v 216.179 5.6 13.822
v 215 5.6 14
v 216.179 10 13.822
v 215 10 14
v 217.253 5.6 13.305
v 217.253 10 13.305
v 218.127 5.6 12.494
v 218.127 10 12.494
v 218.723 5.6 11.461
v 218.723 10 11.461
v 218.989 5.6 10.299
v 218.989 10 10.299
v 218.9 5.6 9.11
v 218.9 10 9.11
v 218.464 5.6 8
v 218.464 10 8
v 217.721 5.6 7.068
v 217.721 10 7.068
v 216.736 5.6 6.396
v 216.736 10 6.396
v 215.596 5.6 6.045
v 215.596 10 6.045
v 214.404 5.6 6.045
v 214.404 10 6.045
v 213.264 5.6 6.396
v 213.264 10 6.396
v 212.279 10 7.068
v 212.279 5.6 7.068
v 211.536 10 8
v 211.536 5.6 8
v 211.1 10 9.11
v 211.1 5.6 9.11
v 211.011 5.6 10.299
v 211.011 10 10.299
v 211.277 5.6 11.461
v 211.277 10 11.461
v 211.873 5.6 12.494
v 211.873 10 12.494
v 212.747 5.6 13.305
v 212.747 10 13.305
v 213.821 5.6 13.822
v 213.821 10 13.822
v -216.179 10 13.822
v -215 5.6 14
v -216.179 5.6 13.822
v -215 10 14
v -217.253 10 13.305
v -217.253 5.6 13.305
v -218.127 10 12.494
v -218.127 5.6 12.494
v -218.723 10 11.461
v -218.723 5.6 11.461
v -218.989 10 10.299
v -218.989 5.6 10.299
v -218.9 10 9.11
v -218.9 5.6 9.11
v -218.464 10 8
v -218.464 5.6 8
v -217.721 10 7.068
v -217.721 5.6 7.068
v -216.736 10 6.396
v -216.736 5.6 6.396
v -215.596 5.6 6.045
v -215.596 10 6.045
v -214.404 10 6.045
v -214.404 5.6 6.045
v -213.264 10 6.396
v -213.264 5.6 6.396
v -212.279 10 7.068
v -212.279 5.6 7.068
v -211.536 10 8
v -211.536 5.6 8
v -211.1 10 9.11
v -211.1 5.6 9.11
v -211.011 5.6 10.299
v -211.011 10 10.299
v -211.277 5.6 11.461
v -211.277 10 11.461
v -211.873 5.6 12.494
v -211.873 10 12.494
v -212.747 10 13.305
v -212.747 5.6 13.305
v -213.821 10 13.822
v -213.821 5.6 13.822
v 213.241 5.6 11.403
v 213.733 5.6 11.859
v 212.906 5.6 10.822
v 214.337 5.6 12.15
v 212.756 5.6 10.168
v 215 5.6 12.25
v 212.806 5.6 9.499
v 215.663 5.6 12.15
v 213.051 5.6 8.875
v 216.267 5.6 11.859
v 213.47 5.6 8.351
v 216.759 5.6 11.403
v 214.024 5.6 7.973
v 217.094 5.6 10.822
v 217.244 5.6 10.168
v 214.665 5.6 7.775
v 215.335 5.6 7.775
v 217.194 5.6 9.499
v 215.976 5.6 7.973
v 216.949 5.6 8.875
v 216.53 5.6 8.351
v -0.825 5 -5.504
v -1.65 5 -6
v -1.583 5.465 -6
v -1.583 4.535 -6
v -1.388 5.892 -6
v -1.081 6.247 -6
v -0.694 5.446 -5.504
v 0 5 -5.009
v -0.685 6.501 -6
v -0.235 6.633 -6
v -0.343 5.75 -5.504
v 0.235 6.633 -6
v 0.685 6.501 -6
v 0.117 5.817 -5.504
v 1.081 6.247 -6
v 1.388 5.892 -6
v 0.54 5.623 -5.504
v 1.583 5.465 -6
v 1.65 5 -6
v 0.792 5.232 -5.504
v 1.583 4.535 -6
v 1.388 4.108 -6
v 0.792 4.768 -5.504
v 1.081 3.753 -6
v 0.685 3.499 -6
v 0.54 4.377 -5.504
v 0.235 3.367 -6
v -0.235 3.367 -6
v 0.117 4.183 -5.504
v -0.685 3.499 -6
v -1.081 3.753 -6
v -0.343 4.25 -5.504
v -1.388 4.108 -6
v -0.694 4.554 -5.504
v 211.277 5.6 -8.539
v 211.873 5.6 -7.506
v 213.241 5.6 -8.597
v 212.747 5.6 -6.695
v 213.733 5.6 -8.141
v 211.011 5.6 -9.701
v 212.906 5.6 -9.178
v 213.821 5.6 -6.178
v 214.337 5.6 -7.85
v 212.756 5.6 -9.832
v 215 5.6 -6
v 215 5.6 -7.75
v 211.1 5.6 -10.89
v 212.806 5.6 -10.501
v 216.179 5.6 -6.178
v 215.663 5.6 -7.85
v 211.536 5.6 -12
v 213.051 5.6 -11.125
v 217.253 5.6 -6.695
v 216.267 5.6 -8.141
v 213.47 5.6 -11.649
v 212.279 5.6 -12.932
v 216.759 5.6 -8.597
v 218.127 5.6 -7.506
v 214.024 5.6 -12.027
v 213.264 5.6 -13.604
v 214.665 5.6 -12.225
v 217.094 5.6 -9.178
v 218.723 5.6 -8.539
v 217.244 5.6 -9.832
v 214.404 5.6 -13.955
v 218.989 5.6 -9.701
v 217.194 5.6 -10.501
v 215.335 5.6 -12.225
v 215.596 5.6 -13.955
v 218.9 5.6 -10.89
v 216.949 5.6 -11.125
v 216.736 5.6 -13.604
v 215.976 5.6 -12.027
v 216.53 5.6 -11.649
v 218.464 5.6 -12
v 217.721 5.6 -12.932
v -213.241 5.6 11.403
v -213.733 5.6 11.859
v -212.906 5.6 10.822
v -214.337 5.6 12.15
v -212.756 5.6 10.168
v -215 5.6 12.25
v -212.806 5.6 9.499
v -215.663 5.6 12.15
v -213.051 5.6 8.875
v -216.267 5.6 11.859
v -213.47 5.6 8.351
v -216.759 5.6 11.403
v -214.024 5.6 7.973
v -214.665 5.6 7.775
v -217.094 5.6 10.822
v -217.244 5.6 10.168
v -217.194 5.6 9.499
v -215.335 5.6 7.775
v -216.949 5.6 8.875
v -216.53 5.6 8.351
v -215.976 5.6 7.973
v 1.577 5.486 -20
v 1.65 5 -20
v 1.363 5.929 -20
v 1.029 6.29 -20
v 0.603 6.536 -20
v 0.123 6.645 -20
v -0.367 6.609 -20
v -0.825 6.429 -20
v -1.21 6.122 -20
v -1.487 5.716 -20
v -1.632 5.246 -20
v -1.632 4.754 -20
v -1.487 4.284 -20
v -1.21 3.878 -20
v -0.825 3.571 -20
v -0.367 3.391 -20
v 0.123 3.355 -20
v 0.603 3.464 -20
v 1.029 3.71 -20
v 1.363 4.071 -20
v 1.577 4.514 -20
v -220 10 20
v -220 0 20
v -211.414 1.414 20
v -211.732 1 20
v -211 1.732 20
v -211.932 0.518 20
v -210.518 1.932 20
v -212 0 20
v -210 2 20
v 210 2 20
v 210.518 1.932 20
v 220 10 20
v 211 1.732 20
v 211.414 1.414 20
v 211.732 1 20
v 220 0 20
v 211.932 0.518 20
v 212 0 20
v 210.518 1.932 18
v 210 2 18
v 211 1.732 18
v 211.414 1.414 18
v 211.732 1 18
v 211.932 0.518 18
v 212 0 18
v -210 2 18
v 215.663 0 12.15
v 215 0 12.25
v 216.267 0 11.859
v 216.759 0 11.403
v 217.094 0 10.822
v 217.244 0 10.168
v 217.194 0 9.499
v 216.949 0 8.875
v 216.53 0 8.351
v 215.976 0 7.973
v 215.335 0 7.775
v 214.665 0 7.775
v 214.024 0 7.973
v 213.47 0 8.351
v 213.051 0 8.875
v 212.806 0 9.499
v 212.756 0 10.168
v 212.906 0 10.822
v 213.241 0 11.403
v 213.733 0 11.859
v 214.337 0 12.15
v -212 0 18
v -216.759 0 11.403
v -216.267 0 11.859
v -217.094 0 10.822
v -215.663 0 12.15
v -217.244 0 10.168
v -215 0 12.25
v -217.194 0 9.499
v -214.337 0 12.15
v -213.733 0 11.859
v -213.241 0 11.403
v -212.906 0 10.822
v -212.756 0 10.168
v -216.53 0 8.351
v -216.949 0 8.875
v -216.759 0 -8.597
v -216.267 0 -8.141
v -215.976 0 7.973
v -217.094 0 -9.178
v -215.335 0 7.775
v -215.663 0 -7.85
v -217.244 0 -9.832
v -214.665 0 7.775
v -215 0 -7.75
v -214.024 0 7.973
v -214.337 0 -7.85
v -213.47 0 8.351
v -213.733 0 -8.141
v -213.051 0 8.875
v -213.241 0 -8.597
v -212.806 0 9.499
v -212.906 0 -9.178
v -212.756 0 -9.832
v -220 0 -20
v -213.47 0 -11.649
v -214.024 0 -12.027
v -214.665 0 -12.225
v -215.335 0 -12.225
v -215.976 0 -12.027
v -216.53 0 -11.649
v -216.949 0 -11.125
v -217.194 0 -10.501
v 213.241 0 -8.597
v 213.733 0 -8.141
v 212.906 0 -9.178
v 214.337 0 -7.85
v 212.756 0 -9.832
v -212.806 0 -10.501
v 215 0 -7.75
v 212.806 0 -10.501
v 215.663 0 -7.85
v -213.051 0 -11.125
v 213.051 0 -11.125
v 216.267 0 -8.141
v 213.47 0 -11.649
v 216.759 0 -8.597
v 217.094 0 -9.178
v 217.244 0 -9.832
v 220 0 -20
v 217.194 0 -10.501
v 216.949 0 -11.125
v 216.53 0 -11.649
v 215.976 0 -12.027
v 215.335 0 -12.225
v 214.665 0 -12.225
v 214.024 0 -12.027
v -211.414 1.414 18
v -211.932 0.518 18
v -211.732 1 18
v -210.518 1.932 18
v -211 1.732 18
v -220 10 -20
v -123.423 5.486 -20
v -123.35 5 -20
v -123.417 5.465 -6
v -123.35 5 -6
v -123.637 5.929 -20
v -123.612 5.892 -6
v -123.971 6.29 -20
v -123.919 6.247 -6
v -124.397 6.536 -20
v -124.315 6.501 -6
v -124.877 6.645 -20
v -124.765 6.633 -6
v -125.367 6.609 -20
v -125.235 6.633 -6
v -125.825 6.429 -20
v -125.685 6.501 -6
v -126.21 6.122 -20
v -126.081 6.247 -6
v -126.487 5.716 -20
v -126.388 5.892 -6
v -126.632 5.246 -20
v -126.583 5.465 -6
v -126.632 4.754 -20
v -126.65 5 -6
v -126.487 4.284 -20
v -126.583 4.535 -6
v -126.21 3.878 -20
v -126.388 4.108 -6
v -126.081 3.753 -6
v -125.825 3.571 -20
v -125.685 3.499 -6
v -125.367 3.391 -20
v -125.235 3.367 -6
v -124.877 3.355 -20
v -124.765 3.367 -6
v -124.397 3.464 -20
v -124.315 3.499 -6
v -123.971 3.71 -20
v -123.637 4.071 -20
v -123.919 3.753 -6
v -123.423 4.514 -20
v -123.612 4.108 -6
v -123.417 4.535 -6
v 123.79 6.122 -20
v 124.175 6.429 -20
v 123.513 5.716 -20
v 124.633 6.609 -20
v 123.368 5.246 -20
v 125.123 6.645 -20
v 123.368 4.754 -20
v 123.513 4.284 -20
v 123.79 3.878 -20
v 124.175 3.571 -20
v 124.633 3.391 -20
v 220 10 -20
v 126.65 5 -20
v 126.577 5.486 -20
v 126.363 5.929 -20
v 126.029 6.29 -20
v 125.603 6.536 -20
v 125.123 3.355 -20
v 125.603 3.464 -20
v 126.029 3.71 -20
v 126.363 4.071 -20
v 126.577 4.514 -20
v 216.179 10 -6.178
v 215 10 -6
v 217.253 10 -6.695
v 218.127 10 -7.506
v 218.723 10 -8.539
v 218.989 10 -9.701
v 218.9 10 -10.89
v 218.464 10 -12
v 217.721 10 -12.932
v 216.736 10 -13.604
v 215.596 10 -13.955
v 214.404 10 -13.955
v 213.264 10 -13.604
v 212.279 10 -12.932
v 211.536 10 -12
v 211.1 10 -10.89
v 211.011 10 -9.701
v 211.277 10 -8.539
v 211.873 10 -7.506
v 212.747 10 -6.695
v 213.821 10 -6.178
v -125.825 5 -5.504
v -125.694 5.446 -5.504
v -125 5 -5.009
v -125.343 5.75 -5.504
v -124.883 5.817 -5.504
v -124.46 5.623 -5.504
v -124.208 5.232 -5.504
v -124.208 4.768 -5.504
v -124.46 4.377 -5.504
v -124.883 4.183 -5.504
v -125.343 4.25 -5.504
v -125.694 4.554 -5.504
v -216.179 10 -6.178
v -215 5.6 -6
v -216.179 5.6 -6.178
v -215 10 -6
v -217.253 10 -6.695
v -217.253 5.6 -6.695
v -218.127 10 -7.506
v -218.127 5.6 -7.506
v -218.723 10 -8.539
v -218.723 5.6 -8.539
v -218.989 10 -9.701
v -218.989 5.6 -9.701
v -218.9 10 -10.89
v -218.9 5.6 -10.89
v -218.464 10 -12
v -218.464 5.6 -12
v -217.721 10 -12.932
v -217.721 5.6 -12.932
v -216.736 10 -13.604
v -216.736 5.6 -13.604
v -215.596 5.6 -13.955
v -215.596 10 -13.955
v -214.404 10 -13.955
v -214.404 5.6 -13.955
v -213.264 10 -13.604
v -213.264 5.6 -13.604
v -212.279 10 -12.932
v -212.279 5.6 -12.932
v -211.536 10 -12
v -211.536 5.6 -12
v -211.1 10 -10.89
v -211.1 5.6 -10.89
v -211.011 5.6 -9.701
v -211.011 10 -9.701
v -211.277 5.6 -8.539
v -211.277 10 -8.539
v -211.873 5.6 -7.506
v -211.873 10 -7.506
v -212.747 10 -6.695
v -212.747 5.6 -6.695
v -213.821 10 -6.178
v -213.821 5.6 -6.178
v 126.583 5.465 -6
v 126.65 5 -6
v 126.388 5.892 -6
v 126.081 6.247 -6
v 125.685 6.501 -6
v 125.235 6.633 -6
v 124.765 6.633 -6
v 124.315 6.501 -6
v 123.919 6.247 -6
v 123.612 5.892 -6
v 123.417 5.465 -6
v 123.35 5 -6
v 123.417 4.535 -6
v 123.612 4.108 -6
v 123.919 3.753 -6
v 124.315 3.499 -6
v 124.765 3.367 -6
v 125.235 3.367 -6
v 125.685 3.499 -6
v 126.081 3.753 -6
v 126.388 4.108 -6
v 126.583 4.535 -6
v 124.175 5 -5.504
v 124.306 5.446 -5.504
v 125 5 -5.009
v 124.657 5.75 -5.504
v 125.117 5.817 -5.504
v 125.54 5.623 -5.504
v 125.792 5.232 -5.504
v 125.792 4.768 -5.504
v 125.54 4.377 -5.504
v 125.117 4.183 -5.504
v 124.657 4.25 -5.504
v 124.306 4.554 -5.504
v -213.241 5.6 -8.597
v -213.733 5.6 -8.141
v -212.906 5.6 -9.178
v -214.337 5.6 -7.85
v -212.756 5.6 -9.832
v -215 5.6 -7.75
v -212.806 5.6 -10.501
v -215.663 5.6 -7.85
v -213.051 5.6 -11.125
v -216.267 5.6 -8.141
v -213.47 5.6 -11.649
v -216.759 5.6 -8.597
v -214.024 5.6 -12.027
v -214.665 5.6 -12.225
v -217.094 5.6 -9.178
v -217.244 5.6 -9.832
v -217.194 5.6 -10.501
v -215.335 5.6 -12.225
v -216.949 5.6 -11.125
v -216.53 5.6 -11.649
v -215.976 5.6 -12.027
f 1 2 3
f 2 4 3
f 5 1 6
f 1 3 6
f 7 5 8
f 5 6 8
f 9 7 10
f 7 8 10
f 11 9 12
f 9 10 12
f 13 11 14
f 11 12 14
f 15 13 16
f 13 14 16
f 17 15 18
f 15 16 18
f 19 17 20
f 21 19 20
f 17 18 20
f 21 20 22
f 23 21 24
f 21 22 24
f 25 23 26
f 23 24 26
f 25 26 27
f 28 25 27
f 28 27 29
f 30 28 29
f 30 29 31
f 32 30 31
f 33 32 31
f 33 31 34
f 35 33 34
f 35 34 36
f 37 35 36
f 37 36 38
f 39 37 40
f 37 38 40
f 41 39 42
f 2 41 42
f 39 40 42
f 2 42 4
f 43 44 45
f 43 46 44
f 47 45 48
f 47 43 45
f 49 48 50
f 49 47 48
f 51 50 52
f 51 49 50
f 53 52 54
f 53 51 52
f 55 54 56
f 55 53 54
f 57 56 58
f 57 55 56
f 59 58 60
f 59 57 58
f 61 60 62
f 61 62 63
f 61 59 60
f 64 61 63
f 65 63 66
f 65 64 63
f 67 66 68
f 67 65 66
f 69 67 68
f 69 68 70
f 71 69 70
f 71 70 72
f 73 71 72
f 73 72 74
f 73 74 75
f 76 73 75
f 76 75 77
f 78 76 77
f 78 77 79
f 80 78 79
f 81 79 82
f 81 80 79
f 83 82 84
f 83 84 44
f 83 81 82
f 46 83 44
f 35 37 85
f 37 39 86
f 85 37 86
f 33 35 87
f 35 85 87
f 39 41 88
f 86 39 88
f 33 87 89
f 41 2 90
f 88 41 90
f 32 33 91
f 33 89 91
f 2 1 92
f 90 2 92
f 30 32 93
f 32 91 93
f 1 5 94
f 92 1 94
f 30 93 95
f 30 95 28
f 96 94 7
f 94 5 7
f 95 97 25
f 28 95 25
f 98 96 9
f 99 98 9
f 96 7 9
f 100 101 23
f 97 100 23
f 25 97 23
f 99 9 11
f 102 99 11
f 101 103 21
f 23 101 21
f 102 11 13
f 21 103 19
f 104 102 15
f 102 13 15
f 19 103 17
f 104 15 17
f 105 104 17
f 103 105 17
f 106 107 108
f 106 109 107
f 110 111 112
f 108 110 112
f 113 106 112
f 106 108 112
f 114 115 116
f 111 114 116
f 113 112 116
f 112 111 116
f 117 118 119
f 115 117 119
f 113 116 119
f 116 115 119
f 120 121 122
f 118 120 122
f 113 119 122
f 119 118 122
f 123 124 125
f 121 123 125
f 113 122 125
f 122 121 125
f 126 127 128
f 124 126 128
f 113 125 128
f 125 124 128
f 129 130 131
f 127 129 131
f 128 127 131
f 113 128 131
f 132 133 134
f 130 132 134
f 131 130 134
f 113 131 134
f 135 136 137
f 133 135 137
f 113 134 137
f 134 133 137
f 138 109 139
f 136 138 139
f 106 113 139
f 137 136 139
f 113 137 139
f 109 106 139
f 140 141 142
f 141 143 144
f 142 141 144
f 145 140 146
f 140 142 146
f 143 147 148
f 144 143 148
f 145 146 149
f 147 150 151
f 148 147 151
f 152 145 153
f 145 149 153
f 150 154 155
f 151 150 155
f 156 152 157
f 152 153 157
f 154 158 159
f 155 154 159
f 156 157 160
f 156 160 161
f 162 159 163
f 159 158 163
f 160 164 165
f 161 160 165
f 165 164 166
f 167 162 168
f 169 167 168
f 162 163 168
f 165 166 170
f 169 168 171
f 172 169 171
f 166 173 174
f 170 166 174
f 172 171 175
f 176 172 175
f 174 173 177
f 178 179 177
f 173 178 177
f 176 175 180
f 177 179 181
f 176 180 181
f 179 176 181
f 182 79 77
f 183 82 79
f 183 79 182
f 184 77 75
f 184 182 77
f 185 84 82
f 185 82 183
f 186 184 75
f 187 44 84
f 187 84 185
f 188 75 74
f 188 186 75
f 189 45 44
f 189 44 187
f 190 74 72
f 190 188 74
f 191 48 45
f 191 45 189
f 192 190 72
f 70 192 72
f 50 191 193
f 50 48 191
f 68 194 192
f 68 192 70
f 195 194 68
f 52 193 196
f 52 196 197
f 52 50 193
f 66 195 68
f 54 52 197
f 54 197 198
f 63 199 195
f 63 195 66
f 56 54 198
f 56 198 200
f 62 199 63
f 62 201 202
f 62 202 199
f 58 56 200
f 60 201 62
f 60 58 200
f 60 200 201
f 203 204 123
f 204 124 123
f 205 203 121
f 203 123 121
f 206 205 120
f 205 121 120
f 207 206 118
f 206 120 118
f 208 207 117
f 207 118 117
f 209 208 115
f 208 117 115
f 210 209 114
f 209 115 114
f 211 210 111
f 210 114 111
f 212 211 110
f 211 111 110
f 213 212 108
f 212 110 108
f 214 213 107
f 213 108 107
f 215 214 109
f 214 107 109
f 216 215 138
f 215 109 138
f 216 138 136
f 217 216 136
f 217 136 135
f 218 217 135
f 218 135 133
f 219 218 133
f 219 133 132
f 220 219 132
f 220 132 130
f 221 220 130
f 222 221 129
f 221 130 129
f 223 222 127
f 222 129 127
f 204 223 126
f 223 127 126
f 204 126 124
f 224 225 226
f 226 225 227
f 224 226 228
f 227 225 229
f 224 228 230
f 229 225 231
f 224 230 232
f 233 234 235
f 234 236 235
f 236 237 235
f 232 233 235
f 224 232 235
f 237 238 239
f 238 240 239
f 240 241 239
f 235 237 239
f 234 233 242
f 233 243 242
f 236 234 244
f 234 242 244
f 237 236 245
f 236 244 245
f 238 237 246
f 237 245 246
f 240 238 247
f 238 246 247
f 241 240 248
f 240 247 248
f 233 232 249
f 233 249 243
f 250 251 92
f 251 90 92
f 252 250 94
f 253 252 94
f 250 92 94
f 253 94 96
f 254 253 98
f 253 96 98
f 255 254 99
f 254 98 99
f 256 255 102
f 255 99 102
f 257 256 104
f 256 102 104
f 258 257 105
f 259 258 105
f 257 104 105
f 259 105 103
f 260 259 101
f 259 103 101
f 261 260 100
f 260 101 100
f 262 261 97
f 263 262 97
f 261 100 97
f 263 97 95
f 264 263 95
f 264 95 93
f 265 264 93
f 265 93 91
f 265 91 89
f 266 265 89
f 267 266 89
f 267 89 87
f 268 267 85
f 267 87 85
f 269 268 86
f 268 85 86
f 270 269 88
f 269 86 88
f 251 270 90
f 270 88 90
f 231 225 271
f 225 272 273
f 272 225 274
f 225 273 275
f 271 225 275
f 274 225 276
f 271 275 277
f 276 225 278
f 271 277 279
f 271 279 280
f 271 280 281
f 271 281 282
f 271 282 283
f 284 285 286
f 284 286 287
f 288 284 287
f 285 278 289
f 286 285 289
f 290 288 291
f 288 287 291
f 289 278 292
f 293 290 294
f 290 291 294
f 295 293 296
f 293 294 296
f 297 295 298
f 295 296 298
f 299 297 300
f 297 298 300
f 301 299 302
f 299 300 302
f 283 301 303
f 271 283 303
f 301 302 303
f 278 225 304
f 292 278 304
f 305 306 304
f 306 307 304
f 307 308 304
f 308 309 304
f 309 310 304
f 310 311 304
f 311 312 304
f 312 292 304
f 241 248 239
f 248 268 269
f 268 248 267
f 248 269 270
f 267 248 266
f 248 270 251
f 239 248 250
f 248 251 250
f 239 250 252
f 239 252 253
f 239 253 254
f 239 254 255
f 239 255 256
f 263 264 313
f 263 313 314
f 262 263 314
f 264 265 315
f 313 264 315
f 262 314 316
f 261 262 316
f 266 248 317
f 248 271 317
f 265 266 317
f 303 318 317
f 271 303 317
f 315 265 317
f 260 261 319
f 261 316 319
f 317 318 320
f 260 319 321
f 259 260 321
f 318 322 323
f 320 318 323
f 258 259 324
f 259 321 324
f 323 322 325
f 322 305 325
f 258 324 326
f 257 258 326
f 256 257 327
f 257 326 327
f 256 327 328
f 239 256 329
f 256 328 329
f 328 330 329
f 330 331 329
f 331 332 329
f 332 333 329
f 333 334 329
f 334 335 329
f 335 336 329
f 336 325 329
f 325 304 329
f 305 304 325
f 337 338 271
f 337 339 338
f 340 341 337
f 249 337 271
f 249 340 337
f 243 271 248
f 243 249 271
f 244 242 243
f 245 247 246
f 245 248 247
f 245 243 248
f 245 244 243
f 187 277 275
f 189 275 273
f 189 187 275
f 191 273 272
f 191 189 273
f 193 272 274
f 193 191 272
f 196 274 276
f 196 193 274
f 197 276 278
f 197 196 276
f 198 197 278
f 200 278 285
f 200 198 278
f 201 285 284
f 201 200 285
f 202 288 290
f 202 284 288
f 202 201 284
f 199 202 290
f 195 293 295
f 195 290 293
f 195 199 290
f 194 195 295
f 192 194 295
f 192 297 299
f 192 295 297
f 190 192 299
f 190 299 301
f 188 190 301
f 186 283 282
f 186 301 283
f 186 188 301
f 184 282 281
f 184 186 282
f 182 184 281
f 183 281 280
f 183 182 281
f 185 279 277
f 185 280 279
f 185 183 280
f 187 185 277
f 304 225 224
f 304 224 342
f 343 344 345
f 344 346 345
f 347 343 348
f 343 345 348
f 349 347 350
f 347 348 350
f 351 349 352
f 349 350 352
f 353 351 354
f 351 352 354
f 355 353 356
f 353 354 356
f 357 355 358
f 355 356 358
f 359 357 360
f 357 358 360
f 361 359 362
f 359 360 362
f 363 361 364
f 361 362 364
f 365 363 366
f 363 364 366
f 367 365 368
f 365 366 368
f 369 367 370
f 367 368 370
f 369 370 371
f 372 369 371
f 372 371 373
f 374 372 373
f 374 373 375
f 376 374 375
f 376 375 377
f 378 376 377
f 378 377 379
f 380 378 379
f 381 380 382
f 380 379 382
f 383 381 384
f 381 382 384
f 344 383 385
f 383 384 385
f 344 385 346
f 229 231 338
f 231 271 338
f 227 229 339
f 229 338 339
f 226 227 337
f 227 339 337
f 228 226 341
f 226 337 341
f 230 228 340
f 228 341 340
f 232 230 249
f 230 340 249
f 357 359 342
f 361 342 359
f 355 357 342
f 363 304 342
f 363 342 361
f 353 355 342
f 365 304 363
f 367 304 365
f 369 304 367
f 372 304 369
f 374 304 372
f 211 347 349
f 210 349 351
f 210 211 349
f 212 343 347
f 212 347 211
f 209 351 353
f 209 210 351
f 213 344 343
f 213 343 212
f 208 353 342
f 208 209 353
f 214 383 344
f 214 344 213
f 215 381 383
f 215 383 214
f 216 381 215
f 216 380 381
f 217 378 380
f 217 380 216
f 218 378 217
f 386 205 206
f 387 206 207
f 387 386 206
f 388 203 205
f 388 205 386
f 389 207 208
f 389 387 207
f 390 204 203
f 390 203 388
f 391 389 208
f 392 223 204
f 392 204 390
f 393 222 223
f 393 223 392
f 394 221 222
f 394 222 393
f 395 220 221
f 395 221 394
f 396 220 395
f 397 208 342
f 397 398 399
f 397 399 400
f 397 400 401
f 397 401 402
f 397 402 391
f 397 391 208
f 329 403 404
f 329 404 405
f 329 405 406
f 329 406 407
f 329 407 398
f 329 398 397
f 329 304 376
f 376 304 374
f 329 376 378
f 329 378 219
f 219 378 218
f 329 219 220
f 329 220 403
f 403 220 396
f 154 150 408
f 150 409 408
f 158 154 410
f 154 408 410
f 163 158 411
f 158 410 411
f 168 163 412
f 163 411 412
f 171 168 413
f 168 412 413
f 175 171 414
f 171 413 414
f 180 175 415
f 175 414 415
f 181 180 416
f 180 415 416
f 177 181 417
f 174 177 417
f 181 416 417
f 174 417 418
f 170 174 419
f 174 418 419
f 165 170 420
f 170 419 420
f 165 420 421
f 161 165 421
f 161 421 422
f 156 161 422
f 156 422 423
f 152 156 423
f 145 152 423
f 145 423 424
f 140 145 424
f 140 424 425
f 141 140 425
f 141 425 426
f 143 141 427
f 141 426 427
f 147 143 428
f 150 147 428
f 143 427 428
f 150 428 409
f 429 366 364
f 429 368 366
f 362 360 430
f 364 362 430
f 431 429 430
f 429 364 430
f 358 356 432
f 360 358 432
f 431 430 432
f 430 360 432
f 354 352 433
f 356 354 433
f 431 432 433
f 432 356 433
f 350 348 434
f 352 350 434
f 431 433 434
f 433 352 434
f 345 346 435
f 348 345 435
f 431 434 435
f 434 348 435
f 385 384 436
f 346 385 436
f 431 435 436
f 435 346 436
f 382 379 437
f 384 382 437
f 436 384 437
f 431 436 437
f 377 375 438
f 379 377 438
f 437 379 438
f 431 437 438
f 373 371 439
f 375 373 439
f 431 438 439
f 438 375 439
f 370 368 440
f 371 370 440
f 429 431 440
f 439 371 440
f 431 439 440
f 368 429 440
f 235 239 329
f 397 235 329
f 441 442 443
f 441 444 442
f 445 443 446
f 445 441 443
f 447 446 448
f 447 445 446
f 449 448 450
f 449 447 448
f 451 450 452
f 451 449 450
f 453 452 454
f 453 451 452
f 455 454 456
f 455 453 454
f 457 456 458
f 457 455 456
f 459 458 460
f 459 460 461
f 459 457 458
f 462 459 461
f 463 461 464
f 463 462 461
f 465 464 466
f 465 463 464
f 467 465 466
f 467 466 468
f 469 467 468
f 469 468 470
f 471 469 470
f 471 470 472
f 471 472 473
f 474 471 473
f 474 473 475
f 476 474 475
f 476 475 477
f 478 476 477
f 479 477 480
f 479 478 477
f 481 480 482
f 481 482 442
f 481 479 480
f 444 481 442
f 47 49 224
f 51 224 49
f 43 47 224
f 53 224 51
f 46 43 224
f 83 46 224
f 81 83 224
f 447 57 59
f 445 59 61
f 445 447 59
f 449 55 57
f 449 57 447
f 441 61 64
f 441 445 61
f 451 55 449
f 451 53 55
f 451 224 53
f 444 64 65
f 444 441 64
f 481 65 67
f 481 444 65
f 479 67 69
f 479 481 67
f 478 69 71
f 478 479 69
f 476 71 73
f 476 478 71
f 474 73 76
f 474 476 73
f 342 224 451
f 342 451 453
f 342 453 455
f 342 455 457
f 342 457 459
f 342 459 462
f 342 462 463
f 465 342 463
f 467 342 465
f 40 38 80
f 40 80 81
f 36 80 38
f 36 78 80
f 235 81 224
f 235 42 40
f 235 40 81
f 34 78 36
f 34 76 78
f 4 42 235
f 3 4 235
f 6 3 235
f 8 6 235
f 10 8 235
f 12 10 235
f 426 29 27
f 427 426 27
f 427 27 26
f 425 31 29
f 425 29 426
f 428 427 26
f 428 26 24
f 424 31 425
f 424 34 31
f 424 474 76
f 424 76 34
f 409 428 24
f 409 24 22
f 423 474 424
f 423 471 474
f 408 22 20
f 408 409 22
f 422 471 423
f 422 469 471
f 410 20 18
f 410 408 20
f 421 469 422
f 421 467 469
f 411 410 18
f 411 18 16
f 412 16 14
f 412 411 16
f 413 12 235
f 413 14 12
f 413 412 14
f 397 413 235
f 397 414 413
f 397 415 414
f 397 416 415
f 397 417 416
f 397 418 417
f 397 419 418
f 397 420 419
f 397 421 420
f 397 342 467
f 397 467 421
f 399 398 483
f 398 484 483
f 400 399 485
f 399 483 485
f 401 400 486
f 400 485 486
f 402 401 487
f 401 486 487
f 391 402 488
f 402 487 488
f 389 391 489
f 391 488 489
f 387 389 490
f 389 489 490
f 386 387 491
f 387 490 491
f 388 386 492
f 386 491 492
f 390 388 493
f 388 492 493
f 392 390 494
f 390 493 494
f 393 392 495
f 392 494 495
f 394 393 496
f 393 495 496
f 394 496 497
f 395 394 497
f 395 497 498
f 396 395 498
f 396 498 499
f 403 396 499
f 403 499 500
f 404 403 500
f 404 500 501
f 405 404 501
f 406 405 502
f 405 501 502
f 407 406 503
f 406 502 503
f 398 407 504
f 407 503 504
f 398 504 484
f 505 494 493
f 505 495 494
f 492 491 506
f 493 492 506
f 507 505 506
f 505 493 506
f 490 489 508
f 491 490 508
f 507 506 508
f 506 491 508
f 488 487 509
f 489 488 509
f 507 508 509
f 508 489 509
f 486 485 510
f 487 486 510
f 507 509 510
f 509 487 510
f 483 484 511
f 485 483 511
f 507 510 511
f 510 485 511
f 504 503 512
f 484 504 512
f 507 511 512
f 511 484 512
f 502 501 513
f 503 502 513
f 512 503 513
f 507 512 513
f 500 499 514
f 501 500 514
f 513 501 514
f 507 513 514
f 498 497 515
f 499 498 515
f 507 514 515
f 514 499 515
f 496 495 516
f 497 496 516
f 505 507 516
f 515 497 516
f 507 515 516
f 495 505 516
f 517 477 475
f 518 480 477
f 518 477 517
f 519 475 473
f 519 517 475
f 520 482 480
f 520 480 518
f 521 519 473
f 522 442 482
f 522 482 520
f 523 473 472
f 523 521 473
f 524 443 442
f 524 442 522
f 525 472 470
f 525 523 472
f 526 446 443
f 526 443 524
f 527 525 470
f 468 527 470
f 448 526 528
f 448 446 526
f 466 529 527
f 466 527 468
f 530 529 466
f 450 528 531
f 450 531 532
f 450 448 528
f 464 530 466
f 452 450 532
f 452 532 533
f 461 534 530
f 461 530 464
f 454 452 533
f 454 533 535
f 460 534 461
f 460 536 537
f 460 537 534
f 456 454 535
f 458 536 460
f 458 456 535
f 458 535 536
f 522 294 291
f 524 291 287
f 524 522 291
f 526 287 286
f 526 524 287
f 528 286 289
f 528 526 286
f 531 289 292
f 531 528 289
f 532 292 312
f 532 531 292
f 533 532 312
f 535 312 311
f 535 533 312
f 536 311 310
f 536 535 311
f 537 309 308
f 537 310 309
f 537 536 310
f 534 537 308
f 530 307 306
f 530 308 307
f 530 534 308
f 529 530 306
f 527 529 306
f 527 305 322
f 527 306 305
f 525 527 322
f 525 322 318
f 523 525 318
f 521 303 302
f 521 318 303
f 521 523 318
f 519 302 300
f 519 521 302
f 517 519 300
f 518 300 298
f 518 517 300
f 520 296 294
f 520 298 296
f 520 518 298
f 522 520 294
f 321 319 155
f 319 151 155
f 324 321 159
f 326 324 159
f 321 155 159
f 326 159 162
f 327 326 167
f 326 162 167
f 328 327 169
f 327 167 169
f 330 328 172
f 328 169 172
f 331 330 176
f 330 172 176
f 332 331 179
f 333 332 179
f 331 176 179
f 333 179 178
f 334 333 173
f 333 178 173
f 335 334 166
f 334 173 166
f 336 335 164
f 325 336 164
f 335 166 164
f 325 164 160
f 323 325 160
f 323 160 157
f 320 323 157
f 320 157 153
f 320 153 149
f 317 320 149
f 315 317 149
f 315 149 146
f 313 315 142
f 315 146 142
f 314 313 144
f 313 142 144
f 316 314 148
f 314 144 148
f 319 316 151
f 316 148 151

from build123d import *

# Parameters (mm, degrees)
SKETCH1_W                                    = 440
SKETCH1_H                                    = 40
BOSS_EXTRUDE1_DEPTH                          = 10
SKETCH2_W                                    = 424
SKETCH2_H                                    = 2
CUT_EXTRUDE1_DEPTH                           = 2
FILLET1_R                                    = 2
CBORE_FOR_M4_HEX_SOCKET_HEAD_CAP_SCR_2_COUNT = 2
CBORE_FOR_M4_HEX_SOCKET_HEAD_CAP_SCR_2_PITCH = 20
M4X0_7_TAPPED_HOLE1_D                        = 3.3
M4X0_7_TAPPED_HOLE1_DEPTH                    = 14
M4X0_7_TAPPED_HOLE1_TIP                      = 0.991420021


with BuildPart() as part:
    # Sketch1 → Boss-Extrude1 (new body)
    with BuildSketch(Plane(origin=(0, 0, 0), x_dir=(1, 0, 0), z_dir=(0, 1, 0))):
        Rectangle(SKETCH1_W, SKETCH1_H)
    extrude(amount=BOSS_EXTRUDE1_DEPTH)

    # Sketch2 → Cut-Extrude1 (cut)
    with BuildSketch(Plane.XY.offset(20)):
        with Locations((0, 1)):
            Rectangle(SKETCH2_W, SKETCH2_H)
    extrude(amount=-CUT_EXTRUDE1_DEPTH, mode=Mode.SUBTRACT)

    # Fillet1
    fillet1_edges = [part.edges().sort_by_distance(p)[0] for p in [
        (-212, 2, 19),
        (212, 2, 19),
    ]]
    fillet(fillet1_edges, radius=FILLET1_R - 0.0001)  # a hair under: the kernel refuses the full size

    # Sketch4 → CBORE for M4 Hex Socket Head Cap Screw1 (revolve, cut)
    with BuildSketch(Plane(origin=(-215, 10, -10), x_dir=(0, 0, 1), z_dir=(1, 0, 0))):
        Polygon((0, 0), (0, 15.351936393), (2.25, 14), (2.25, 4.4), (4, 4.4), (4, 0), align=None)
    cbore_for_m4_hex_socket_head_cap_screw1 = revolve(axis=Axis((-215, 16.35, -10), (0, -1, 0)), mode=Mode.SUBTRACT)

    # CBORE for M4 Hex Socket Head Cap Scr 2: CBORE for M4 Hex Socket Head Cap Screw1 ×2
    with Locations(*[(0, 0, i * CBORE_FOR_M4_HEX_SOCKET_HEAD_CAP_SCR_2_PITCH) for i in range(1, CBORE_FOR_M4_HEX_SOCKET_HEAD_CAP_SCR_2_COUNT)]):
        add(cbore_for_m4_hex_socket_head_cap_screw1, mode=Mode.SUBTRACT)

    # Mirror1: CBORE for M4 Hex Socket Head Cap Screw1 across plane
    add(cbore_for_m4_hex_socket_head_cap_screw1.mirror(Plane(origin=(0, 0, 0), x_dir=(0, 0, 1), z_dir=(1, 0, 0))), mode=Mode.SUBTRACT)

    # Mirror1 copy 1 sketch → Mirror1 copy 1 (revolve, cut)
    with BuildSketch(Plane(origin=(215, 10, 10), x_dir=(0, 0, 1), z_dir=(-1, 0, 0))):
        Polygon((0, 0), (0, -15.351936393), (2.25, -14), (2.25, -4.4), (4, -4.4), (4, 0), align=None)
    revolve(axis=Axis((215, 16.35, 10), (0, 1, 0)), mode=Mode.SUBTRACT)

    # M4x0.7 Tapped Hole1
    with Locations(Plane(origin=(0, 0, -20), x_dir=(-1, 0, 0), z_dir=(0, 0, -1))):
        with Locations((125, 5), (0, 5), (-125, 5)):
            Hole(M4X0_7_TAPPED_HOLE1_D / 2, depth=M4X0_7_TAPPED_HOLE1_DEPTH)
            with Locations((0, 0, -(M4X0_7_TAPPED_HOLE1_DEPTH + M4X0_7_TAPPED_HOLE1_TIP / 2))):  # 118° drill point
                Cone(0, M4X0_7_TAPPED_HOLE1_D / 2, M4X0_7_TAPPED_HOLE1_TIP, mode=Mode.SUBTRACT)


solid = part.part
